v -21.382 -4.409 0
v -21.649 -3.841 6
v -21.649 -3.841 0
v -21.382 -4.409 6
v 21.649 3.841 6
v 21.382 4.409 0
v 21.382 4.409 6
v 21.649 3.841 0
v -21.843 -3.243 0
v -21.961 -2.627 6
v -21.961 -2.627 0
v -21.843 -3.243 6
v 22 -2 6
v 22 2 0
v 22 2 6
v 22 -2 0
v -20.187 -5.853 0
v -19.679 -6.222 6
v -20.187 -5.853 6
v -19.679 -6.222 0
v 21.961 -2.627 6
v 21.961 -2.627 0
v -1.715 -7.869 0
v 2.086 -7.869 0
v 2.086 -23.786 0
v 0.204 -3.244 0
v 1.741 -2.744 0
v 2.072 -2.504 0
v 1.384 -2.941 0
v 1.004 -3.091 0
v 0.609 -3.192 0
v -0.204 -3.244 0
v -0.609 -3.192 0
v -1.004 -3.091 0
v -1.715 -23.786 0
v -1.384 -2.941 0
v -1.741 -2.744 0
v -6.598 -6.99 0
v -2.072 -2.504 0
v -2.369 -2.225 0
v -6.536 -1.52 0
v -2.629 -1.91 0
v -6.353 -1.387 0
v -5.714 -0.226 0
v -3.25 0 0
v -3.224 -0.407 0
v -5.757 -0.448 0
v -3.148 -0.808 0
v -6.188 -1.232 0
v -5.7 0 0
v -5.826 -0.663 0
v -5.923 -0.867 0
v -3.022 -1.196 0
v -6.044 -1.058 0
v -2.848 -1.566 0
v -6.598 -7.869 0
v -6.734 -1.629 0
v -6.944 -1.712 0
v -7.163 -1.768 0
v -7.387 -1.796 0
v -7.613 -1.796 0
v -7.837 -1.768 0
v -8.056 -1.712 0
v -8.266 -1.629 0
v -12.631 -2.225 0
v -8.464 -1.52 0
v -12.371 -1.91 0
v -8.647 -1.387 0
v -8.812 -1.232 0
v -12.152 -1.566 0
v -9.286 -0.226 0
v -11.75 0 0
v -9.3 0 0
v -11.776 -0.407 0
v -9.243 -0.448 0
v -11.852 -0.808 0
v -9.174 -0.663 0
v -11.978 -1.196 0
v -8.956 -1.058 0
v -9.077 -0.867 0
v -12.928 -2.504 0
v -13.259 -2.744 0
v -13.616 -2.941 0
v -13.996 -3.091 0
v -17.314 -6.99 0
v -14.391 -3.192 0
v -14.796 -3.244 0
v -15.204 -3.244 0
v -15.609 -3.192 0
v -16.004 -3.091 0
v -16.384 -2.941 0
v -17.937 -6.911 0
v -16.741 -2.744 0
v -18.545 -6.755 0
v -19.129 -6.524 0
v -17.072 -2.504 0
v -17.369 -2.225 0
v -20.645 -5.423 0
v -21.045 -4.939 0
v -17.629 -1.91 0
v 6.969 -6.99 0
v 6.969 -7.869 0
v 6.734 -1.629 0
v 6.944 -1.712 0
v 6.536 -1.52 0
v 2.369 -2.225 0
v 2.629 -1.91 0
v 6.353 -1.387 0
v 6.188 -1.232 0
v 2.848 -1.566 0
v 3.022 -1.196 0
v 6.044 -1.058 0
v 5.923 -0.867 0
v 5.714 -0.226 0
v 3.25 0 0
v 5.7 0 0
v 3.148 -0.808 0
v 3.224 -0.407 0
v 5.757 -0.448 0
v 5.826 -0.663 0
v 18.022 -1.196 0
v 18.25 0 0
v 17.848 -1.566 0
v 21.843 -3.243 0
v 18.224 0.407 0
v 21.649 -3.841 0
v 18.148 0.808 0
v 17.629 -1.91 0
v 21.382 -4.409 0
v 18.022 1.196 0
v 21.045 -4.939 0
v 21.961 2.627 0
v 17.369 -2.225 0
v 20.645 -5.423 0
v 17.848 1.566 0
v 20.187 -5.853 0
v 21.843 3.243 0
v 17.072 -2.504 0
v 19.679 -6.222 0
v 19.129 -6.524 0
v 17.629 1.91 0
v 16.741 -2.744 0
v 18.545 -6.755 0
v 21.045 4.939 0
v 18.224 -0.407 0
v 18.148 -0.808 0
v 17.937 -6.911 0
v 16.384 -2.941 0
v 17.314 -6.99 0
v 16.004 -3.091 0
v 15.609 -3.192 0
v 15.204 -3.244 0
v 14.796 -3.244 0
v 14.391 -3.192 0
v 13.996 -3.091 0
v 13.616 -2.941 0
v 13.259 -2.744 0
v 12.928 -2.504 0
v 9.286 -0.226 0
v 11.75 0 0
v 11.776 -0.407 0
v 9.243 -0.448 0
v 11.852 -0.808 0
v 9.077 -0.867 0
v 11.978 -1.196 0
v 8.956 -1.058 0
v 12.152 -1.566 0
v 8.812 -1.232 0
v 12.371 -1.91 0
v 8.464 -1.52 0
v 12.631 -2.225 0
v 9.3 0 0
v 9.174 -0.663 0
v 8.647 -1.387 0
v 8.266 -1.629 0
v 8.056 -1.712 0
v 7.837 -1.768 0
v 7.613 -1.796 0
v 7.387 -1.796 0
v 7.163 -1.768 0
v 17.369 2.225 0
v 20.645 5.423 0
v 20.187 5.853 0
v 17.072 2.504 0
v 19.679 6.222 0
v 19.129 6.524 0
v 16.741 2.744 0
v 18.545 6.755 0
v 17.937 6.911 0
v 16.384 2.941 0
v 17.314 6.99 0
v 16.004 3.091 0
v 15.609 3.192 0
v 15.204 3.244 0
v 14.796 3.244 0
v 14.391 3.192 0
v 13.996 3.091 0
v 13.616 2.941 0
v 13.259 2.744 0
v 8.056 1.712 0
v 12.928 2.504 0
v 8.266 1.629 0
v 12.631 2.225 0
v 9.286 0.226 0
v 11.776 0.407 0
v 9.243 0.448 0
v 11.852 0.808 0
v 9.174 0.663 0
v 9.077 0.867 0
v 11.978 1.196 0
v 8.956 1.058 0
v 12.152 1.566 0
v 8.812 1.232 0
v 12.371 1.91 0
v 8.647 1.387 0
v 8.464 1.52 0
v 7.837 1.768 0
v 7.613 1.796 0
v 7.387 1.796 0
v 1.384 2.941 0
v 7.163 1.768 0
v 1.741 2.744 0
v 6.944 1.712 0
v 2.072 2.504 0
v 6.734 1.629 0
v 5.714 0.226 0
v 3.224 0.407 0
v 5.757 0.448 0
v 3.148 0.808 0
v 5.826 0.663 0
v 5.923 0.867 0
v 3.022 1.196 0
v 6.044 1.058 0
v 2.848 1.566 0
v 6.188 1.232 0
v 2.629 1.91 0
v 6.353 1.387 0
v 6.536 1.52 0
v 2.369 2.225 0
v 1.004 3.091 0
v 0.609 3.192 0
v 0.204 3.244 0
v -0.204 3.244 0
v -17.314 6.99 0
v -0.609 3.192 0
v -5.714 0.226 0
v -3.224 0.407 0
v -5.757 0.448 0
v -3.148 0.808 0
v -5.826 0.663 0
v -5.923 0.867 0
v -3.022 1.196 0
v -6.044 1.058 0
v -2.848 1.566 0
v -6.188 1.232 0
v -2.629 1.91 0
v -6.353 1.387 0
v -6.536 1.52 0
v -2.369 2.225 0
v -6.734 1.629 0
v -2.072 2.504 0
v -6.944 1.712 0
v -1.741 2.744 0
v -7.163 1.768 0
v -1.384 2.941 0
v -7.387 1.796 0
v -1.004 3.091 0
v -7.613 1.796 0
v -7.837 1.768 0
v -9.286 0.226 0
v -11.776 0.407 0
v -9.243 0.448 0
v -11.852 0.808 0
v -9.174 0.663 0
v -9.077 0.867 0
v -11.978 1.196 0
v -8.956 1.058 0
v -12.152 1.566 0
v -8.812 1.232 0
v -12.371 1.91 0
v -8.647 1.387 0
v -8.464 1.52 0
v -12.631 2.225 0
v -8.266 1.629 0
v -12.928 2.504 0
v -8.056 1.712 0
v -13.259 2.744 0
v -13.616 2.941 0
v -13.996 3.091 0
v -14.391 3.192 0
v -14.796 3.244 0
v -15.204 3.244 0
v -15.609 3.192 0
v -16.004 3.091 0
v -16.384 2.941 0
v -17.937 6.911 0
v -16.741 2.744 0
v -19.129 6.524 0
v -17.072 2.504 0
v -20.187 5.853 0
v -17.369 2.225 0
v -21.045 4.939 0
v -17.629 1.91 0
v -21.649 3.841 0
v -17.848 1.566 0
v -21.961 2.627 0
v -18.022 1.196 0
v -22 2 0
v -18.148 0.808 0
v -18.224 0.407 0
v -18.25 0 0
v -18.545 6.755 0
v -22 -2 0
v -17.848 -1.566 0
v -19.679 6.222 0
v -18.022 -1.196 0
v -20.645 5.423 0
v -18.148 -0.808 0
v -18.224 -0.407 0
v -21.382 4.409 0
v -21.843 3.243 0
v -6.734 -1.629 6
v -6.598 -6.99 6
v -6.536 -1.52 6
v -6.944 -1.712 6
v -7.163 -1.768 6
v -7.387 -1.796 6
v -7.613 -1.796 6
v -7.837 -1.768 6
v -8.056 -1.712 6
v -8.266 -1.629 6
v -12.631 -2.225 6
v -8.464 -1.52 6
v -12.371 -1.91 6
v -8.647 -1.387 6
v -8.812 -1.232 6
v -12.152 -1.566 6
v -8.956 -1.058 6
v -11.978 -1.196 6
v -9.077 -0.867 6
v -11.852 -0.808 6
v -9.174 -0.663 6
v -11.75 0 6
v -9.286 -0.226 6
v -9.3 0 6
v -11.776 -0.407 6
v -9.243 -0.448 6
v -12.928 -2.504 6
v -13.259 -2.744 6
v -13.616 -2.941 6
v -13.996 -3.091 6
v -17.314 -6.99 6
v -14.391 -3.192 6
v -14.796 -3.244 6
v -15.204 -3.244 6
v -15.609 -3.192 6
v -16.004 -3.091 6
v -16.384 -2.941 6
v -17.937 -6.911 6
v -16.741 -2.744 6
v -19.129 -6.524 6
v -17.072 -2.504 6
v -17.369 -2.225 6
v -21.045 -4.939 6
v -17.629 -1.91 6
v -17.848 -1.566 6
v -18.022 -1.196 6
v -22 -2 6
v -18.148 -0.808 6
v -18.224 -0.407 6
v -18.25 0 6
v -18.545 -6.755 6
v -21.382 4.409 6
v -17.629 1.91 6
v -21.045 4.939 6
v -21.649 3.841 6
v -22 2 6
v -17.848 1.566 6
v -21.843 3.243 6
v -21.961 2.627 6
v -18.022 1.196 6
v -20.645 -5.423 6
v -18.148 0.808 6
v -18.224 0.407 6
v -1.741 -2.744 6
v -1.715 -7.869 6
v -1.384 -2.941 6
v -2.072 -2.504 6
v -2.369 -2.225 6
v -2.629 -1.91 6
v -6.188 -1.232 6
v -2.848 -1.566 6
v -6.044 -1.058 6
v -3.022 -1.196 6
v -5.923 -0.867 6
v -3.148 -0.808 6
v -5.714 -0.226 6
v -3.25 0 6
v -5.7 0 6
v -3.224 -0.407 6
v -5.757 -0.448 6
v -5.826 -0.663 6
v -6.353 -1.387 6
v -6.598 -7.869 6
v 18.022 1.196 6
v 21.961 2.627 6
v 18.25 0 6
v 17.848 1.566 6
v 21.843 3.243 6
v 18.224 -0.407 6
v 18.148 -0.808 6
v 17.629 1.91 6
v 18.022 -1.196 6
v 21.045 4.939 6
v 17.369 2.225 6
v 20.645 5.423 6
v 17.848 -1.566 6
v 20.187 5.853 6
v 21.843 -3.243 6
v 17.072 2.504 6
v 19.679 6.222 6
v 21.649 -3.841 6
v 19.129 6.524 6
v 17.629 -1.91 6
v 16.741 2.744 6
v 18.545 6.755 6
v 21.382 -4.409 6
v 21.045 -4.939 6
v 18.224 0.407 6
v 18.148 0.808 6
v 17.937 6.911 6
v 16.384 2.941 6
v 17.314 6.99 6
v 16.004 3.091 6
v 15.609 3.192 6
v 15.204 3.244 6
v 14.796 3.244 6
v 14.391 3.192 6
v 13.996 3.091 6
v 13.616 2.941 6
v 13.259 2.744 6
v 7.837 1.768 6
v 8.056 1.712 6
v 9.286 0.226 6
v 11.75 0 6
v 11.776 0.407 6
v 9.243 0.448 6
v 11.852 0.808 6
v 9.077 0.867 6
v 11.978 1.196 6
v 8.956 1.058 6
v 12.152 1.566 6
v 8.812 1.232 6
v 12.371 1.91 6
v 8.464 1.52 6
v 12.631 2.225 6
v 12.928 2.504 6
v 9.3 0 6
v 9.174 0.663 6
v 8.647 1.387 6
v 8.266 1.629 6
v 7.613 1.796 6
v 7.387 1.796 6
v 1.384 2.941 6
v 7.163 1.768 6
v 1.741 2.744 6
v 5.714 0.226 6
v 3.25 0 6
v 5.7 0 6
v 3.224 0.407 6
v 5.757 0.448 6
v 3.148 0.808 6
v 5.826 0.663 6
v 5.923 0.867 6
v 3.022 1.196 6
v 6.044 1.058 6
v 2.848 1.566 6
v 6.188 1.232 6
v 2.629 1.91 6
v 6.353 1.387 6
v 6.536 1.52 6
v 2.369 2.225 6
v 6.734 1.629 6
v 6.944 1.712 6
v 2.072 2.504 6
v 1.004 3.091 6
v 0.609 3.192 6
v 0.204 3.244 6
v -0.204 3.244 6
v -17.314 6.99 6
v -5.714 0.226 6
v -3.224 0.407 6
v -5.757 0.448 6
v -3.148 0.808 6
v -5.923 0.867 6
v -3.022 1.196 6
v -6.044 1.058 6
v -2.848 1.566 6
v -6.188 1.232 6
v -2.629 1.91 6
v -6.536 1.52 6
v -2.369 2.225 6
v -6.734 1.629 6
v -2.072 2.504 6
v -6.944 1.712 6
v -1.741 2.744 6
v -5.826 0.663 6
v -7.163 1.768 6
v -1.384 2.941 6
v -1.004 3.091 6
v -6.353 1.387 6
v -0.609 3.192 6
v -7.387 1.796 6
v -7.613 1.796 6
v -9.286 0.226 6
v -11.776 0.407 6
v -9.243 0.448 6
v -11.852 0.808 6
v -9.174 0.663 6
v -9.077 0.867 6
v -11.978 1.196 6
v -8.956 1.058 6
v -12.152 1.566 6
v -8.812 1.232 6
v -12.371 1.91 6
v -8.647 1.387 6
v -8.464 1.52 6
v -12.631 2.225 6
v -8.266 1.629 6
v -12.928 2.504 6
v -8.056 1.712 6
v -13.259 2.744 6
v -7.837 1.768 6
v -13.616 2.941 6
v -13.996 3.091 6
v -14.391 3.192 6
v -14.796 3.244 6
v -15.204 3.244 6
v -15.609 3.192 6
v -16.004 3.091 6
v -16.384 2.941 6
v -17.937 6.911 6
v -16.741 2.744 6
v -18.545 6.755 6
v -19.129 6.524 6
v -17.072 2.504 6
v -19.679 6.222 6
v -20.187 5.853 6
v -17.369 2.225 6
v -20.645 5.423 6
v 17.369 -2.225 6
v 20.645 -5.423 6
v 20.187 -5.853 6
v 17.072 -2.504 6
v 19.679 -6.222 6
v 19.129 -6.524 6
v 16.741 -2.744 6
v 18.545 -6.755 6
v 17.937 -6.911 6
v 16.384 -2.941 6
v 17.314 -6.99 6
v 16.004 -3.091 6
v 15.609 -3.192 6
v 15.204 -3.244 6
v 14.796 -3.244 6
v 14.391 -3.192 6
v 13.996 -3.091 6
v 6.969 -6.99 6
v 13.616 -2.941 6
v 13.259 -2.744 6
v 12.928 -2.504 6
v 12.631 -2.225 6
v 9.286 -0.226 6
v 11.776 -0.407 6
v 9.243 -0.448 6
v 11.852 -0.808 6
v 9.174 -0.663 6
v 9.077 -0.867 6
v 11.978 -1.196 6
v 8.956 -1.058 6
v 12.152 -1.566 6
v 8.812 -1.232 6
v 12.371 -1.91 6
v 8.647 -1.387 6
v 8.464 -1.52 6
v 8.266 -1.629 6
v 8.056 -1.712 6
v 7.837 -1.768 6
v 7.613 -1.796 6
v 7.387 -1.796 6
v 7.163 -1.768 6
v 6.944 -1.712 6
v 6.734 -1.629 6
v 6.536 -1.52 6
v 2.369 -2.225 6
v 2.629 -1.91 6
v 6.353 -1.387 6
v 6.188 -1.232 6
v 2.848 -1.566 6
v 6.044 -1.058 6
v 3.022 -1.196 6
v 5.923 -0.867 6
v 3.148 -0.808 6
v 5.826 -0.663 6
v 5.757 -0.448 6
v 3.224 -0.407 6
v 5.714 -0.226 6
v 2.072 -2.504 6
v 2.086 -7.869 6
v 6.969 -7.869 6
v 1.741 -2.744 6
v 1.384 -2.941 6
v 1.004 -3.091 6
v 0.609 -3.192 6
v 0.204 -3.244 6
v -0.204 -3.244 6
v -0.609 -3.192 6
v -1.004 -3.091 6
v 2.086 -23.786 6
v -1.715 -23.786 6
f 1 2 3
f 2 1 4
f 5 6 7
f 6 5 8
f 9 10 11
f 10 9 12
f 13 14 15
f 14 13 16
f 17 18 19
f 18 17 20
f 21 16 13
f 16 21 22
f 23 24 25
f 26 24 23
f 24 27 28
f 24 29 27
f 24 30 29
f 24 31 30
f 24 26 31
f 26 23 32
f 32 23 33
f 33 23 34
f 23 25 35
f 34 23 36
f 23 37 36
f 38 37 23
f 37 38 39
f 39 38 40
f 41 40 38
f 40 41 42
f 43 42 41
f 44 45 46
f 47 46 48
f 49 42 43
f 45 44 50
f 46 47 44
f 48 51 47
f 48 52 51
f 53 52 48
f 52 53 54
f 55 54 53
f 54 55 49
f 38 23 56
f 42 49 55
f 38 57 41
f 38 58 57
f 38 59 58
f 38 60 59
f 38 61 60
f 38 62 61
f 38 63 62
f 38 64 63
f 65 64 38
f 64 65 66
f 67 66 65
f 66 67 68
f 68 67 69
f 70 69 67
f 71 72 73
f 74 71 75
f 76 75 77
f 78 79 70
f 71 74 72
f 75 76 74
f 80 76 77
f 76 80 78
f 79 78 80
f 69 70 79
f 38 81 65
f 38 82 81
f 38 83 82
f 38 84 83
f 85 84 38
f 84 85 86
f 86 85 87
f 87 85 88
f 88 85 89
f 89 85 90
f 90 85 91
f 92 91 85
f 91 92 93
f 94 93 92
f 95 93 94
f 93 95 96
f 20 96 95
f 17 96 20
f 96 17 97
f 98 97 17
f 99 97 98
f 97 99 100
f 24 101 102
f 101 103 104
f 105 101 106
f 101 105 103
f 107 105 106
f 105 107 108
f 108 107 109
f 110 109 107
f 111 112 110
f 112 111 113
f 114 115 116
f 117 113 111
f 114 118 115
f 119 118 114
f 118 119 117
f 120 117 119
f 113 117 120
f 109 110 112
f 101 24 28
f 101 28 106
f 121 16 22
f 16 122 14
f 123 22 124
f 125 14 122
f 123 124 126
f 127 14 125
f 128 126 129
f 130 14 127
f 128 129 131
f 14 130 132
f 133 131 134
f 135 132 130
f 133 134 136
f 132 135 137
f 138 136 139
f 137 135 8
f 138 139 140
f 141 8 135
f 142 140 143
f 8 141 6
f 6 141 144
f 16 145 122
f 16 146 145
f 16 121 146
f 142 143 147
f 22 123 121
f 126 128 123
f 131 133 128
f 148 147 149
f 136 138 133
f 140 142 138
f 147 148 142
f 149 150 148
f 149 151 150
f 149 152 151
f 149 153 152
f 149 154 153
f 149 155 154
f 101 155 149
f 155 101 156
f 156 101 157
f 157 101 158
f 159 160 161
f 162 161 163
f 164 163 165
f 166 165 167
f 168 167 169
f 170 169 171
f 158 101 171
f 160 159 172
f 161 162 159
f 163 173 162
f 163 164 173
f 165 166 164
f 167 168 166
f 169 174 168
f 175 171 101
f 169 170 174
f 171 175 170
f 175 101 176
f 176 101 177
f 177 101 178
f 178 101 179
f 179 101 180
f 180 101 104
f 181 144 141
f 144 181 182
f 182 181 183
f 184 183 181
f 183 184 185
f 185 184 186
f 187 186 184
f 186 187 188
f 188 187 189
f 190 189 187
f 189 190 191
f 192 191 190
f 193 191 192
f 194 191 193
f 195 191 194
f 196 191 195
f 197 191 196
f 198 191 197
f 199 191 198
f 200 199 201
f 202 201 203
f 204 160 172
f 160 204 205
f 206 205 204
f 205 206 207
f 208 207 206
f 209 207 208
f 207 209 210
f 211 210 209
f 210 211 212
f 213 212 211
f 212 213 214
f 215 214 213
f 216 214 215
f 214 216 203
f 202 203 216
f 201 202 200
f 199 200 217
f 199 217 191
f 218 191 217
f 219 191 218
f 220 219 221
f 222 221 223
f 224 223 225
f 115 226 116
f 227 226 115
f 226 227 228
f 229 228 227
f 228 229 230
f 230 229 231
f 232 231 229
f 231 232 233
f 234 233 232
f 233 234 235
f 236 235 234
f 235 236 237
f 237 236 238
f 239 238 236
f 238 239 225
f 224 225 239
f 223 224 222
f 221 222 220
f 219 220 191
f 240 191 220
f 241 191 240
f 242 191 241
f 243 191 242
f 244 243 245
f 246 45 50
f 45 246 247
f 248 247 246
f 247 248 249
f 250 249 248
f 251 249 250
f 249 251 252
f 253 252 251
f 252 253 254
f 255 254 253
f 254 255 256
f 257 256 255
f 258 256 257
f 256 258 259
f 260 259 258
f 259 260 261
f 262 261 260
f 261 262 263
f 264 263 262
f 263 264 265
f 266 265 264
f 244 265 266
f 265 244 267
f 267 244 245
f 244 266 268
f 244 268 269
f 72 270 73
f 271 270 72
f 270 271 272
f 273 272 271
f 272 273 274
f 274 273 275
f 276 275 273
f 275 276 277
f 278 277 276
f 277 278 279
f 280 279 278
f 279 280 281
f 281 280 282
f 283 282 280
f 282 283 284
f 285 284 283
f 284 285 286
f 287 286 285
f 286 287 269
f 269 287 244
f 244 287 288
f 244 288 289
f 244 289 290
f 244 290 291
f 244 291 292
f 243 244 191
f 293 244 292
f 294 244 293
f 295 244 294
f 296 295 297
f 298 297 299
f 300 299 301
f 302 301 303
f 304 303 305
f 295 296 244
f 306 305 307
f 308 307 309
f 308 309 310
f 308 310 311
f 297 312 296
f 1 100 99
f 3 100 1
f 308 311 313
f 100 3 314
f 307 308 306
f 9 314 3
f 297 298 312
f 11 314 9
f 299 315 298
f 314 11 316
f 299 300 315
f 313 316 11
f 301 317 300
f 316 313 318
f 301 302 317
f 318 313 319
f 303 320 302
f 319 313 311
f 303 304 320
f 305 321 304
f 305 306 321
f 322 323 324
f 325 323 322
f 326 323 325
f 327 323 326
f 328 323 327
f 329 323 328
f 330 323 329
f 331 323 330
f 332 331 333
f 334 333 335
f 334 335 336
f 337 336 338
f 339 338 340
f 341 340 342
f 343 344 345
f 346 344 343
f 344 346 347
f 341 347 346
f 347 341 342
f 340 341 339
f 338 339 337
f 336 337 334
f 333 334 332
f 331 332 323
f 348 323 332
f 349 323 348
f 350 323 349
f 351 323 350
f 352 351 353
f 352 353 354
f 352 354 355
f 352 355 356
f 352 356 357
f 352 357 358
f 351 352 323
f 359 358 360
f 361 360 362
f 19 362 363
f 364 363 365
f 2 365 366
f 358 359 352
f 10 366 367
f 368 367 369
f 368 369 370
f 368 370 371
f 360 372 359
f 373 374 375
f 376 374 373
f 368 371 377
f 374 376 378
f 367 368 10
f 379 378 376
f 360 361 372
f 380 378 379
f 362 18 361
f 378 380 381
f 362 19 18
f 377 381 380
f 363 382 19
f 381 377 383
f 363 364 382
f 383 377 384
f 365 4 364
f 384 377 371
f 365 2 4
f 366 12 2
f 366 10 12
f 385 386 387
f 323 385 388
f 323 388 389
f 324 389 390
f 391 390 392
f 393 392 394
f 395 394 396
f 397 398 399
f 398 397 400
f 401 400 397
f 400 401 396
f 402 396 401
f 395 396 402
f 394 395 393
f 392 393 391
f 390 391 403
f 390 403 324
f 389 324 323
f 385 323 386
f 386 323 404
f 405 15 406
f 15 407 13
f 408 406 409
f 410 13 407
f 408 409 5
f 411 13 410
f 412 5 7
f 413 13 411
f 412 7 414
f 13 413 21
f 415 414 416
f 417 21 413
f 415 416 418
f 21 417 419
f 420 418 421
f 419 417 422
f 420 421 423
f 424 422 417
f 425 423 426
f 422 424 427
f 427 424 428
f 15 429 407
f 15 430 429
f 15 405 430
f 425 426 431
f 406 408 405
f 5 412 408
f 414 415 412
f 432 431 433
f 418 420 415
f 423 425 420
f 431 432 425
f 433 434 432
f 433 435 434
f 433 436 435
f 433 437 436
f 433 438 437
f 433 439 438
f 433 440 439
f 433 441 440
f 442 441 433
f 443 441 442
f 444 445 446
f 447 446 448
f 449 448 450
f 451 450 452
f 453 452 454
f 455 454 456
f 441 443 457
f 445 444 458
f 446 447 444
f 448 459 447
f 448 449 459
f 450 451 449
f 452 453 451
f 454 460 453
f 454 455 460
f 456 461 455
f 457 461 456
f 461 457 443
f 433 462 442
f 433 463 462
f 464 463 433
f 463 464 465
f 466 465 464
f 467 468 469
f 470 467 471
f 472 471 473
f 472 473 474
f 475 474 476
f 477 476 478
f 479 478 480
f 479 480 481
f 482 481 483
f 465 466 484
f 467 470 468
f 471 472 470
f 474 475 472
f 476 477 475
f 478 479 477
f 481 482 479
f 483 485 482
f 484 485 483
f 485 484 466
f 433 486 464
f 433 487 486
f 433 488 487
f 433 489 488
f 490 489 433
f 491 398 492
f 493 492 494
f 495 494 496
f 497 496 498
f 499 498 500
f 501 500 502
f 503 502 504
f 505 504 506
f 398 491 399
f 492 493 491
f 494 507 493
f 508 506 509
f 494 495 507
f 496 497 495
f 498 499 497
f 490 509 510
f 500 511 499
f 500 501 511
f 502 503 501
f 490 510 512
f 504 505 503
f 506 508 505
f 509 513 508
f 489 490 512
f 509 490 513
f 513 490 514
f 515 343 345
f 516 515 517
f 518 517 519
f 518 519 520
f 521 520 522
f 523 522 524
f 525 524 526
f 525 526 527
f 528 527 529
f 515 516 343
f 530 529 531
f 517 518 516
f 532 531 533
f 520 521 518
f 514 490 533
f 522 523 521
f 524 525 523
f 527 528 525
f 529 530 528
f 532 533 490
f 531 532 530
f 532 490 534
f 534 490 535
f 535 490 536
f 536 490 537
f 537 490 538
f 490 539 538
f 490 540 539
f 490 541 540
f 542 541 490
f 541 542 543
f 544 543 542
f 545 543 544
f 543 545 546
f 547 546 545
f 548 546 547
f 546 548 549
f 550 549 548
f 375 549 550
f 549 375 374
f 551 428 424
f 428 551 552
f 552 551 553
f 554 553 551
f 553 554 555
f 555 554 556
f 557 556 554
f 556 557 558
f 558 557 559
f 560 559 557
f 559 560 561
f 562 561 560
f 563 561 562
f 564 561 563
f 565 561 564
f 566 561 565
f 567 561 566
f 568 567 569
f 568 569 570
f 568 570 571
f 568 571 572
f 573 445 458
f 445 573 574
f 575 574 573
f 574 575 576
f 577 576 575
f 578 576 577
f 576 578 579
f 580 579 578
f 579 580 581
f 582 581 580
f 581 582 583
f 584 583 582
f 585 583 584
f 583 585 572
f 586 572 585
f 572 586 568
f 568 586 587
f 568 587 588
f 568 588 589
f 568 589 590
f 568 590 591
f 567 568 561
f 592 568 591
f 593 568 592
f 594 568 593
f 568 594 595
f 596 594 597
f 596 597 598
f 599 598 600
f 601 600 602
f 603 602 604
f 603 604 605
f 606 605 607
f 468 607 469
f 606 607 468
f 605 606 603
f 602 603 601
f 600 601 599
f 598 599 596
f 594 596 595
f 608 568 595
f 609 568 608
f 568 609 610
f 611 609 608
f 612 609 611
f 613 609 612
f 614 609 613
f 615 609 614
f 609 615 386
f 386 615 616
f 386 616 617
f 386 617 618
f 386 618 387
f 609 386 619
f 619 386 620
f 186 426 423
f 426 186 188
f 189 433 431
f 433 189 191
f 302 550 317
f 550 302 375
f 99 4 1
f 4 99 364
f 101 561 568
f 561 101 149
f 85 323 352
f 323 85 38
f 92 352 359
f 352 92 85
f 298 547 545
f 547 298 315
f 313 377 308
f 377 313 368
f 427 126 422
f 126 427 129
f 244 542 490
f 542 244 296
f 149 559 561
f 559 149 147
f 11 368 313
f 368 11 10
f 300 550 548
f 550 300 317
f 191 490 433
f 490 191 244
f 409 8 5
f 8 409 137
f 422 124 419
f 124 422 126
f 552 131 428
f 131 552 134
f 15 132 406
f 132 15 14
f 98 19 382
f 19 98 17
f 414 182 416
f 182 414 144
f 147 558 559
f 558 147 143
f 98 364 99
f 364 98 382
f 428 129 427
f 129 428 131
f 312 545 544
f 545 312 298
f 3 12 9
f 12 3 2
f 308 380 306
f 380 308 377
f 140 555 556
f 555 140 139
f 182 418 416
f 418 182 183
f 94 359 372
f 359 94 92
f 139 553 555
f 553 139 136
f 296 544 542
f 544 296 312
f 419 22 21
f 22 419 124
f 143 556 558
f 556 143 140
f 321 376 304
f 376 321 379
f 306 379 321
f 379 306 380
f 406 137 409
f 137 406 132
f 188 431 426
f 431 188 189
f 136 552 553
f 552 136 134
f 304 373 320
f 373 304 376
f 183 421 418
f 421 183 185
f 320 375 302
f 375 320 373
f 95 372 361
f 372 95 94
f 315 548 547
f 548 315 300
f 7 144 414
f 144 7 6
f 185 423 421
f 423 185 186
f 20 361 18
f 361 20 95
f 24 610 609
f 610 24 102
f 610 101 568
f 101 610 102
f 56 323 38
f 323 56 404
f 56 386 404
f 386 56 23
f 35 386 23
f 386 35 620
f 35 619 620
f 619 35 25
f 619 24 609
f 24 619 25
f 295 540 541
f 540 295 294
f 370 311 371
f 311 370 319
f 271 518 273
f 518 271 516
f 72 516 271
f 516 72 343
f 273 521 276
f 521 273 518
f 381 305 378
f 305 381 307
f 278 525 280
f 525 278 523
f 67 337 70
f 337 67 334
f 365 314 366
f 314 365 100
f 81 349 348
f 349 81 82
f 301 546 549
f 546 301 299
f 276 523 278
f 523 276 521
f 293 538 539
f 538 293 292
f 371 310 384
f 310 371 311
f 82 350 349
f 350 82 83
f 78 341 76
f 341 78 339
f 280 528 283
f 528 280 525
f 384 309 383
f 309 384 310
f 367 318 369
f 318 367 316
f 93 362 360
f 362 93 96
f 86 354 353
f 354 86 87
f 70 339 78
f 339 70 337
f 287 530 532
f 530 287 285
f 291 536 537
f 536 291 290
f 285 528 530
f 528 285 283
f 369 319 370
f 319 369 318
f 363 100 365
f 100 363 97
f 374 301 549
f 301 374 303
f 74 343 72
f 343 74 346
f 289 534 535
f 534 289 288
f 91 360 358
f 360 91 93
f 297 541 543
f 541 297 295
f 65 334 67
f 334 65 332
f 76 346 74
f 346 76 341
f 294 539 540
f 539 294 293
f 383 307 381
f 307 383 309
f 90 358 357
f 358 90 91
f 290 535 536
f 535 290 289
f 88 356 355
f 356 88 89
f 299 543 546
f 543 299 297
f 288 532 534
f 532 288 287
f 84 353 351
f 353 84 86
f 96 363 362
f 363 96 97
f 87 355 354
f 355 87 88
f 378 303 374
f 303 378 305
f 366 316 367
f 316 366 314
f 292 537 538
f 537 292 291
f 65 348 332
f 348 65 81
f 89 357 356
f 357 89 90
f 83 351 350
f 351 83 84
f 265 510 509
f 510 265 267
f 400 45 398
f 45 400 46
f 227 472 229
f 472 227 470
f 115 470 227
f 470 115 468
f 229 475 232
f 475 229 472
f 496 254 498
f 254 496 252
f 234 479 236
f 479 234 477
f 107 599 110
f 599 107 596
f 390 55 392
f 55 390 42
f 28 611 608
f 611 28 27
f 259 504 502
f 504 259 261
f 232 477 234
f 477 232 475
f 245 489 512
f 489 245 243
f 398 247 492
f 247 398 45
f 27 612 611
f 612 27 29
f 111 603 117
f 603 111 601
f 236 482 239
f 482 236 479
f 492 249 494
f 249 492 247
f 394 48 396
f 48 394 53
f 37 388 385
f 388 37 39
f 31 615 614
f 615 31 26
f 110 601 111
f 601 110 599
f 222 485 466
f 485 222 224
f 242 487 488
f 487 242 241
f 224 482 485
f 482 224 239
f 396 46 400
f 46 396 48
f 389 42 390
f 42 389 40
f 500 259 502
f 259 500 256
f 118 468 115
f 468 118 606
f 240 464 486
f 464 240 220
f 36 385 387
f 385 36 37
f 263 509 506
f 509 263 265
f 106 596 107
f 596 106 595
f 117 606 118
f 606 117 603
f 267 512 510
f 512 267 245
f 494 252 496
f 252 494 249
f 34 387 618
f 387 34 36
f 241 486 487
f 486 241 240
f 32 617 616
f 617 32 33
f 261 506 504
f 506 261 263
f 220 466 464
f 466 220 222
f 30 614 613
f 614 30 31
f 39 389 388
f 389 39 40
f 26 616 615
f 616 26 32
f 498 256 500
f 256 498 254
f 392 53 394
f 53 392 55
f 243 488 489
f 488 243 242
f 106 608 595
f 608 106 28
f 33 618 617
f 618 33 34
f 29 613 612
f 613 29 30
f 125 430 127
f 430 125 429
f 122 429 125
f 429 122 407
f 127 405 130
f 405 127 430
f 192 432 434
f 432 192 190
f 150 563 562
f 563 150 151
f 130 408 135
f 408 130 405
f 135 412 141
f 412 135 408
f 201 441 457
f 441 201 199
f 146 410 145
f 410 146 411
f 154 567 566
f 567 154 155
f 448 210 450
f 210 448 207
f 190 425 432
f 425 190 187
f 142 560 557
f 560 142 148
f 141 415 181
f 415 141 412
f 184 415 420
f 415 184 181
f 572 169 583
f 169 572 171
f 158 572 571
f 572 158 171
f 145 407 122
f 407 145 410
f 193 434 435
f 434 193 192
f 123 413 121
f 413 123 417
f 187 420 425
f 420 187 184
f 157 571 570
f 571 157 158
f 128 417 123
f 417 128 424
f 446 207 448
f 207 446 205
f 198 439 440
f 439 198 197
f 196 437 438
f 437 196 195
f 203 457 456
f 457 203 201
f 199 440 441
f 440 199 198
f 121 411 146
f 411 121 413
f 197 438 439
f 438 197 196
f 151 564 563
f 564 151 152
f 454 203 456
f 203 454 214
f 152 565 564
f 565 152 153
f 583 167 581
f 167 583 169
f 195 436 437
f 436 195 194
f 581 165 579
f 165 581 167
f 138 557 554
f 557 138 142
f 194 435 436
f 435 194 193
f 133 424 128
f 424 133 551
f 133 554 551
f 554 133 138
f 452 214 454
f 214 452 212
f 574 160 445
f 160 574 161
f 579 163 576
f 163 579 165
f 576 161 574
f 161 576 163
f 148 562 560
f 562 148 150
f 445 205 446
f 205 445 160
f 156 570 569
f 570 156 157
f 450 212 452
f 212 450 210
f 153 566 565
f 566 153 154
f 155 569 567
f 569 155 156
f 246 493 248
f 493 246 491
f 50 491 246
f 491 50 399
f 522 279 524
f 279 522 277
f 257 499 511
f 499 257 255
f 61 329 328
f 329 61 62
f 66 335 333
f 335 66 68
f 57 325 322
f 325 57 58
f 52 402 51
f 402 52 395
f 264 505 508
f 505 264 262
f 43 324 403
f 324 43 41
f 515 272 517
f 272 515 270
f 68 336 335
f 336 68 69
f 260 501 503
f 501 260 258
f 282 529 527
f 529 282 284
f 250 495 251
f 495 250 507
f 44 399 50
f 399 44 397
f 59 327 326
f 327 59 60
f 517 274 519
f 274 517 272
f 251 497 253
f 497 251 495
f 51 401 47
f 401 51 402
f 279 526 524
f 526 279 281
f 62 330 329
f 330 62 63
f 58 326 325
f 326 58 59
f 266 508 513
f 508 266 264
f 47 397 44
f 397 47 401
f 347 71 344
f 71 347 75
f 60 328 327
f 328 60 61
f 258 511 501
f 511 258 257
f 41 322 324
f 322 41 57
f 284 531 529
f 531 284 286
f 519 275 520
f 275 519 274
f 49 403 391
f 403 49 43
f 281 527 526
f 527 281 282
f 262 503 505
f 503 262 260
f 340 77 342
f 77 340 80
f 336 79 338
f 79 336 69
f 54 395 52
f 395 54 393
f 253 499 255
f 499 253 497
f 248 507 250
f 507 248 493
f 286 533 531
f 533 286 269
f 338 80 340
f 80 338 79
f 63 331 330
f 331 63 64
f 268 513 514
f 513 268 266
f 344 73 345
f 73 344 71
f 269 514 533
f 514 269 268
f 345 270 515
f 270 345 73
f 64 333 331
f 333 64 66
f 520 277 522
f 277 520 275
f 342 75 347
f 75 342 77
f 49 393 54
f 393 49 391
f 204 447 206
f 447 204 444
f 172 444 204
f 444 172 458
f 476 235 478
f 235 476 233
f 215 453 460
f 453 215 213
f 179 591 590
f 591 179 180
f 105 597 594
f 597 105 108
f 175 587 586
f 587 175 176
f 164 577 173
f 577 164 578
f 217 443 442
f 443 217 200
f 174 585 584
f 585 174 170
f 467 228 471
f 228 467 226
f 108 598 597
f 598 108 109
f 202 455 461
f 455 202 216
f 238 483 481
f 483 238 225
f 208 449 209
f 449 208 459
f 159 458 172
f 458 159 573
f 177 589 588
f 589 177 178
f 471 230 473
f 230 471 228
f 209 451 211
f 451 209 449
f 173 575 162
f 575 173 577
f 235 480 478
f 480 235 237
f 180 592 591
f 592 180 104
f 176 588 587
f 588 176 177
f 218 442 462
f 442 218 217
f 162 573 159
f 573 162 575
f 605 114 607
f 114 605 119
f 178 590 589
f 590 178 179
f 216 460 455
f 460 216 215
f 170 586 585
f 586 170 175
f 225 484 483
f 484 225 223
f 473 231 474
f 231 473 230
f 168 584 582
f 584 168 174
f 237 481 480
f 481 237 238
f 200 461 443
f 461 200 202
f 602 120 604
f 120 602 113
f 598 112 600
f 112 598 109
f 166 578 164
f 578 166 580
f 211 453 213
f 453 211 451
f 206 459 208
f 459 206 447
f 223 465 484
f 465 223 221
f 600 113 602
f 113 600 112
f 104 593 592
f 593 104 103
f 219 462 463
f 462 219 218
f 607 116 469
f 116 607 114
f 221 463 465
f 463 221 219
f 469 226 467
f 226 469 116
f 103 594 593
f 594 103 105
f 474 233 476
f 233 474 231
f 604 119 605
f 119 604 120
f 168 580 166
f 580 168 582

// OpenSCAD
$fn = 50;


difference() {
	union() {
		hull() {
			translate(v = [-17.0000000000, 2.0000000000, 0]) {
				cylinder(h = 6, r = 5);
			}
			translate(v = [17.0000000000, 2.0000000000, 0]) {
				cylinder(h = 6, r = 5);
			}
			translate(v = [-17.0000000000, -2.0000000000, 0]) {
				cylinder(h = 6, r = 5);
			}
			translate(v = [17.0000000000, -2.0000000000, 0]) {
				cylinder(h = 6, r = 5);
			}
		}
		translate(v = [0, -5, 0]) {
			linear_extrude(height = 6) {
				text(font = "DejaVu Sans Mono:style=Bold", halign = "center", size = 19.0000000000, text = "T", valign = "top");
			}
		}
	}
	union() {
		translate(v = [-15.0000000000, 0.0000000000, 0]) {
			translate(v = [0, 0, -100]) {
				cylinder(h = 200, r = 3.2500000000);
			}
		}
		translate(v = [0, 0, -100]) {
			cylinder(h = 200, r = 3.2500000000);
		}
		translate(v = [15.0000000000, 0.0000000000, 0]) {
			translate(v = [0, 0, -100]) {
				cylinder(h = 200, r = 3.2500000000);
			}
		}
		translate(v = [-15.0000000000, 0.0000000000, 0]) {
			translate(v = [0, 0, -100]) {
				cylinder(h = 200, r = 1.8000000000);
			}
		}
		translate(v = [-7.5000000000, 0.0000000000, 0]) {
			translate(v = [0, 0, -100]) {
				cylinder(h = 200, r = 1.8000000000);
			}
		}
		translate(v = [0, 0, -100]) {
			cylinder(h = 200, r = 1.8000000000);
		}
		translate(v = [7.5000000000, 0.0000000000, 0]) {
			translate(v = [0, 0, -100]) {
				cylinder(h = 200, r = 1.8000000000);
			}
		}
		translate(v = [15.0000000000, 0.0000000000, 0]) {
			translate(v = [0, 0, -100]) {
				cylinder(h = 200, r = 1.8000000000);
			}
		}
	}
}
